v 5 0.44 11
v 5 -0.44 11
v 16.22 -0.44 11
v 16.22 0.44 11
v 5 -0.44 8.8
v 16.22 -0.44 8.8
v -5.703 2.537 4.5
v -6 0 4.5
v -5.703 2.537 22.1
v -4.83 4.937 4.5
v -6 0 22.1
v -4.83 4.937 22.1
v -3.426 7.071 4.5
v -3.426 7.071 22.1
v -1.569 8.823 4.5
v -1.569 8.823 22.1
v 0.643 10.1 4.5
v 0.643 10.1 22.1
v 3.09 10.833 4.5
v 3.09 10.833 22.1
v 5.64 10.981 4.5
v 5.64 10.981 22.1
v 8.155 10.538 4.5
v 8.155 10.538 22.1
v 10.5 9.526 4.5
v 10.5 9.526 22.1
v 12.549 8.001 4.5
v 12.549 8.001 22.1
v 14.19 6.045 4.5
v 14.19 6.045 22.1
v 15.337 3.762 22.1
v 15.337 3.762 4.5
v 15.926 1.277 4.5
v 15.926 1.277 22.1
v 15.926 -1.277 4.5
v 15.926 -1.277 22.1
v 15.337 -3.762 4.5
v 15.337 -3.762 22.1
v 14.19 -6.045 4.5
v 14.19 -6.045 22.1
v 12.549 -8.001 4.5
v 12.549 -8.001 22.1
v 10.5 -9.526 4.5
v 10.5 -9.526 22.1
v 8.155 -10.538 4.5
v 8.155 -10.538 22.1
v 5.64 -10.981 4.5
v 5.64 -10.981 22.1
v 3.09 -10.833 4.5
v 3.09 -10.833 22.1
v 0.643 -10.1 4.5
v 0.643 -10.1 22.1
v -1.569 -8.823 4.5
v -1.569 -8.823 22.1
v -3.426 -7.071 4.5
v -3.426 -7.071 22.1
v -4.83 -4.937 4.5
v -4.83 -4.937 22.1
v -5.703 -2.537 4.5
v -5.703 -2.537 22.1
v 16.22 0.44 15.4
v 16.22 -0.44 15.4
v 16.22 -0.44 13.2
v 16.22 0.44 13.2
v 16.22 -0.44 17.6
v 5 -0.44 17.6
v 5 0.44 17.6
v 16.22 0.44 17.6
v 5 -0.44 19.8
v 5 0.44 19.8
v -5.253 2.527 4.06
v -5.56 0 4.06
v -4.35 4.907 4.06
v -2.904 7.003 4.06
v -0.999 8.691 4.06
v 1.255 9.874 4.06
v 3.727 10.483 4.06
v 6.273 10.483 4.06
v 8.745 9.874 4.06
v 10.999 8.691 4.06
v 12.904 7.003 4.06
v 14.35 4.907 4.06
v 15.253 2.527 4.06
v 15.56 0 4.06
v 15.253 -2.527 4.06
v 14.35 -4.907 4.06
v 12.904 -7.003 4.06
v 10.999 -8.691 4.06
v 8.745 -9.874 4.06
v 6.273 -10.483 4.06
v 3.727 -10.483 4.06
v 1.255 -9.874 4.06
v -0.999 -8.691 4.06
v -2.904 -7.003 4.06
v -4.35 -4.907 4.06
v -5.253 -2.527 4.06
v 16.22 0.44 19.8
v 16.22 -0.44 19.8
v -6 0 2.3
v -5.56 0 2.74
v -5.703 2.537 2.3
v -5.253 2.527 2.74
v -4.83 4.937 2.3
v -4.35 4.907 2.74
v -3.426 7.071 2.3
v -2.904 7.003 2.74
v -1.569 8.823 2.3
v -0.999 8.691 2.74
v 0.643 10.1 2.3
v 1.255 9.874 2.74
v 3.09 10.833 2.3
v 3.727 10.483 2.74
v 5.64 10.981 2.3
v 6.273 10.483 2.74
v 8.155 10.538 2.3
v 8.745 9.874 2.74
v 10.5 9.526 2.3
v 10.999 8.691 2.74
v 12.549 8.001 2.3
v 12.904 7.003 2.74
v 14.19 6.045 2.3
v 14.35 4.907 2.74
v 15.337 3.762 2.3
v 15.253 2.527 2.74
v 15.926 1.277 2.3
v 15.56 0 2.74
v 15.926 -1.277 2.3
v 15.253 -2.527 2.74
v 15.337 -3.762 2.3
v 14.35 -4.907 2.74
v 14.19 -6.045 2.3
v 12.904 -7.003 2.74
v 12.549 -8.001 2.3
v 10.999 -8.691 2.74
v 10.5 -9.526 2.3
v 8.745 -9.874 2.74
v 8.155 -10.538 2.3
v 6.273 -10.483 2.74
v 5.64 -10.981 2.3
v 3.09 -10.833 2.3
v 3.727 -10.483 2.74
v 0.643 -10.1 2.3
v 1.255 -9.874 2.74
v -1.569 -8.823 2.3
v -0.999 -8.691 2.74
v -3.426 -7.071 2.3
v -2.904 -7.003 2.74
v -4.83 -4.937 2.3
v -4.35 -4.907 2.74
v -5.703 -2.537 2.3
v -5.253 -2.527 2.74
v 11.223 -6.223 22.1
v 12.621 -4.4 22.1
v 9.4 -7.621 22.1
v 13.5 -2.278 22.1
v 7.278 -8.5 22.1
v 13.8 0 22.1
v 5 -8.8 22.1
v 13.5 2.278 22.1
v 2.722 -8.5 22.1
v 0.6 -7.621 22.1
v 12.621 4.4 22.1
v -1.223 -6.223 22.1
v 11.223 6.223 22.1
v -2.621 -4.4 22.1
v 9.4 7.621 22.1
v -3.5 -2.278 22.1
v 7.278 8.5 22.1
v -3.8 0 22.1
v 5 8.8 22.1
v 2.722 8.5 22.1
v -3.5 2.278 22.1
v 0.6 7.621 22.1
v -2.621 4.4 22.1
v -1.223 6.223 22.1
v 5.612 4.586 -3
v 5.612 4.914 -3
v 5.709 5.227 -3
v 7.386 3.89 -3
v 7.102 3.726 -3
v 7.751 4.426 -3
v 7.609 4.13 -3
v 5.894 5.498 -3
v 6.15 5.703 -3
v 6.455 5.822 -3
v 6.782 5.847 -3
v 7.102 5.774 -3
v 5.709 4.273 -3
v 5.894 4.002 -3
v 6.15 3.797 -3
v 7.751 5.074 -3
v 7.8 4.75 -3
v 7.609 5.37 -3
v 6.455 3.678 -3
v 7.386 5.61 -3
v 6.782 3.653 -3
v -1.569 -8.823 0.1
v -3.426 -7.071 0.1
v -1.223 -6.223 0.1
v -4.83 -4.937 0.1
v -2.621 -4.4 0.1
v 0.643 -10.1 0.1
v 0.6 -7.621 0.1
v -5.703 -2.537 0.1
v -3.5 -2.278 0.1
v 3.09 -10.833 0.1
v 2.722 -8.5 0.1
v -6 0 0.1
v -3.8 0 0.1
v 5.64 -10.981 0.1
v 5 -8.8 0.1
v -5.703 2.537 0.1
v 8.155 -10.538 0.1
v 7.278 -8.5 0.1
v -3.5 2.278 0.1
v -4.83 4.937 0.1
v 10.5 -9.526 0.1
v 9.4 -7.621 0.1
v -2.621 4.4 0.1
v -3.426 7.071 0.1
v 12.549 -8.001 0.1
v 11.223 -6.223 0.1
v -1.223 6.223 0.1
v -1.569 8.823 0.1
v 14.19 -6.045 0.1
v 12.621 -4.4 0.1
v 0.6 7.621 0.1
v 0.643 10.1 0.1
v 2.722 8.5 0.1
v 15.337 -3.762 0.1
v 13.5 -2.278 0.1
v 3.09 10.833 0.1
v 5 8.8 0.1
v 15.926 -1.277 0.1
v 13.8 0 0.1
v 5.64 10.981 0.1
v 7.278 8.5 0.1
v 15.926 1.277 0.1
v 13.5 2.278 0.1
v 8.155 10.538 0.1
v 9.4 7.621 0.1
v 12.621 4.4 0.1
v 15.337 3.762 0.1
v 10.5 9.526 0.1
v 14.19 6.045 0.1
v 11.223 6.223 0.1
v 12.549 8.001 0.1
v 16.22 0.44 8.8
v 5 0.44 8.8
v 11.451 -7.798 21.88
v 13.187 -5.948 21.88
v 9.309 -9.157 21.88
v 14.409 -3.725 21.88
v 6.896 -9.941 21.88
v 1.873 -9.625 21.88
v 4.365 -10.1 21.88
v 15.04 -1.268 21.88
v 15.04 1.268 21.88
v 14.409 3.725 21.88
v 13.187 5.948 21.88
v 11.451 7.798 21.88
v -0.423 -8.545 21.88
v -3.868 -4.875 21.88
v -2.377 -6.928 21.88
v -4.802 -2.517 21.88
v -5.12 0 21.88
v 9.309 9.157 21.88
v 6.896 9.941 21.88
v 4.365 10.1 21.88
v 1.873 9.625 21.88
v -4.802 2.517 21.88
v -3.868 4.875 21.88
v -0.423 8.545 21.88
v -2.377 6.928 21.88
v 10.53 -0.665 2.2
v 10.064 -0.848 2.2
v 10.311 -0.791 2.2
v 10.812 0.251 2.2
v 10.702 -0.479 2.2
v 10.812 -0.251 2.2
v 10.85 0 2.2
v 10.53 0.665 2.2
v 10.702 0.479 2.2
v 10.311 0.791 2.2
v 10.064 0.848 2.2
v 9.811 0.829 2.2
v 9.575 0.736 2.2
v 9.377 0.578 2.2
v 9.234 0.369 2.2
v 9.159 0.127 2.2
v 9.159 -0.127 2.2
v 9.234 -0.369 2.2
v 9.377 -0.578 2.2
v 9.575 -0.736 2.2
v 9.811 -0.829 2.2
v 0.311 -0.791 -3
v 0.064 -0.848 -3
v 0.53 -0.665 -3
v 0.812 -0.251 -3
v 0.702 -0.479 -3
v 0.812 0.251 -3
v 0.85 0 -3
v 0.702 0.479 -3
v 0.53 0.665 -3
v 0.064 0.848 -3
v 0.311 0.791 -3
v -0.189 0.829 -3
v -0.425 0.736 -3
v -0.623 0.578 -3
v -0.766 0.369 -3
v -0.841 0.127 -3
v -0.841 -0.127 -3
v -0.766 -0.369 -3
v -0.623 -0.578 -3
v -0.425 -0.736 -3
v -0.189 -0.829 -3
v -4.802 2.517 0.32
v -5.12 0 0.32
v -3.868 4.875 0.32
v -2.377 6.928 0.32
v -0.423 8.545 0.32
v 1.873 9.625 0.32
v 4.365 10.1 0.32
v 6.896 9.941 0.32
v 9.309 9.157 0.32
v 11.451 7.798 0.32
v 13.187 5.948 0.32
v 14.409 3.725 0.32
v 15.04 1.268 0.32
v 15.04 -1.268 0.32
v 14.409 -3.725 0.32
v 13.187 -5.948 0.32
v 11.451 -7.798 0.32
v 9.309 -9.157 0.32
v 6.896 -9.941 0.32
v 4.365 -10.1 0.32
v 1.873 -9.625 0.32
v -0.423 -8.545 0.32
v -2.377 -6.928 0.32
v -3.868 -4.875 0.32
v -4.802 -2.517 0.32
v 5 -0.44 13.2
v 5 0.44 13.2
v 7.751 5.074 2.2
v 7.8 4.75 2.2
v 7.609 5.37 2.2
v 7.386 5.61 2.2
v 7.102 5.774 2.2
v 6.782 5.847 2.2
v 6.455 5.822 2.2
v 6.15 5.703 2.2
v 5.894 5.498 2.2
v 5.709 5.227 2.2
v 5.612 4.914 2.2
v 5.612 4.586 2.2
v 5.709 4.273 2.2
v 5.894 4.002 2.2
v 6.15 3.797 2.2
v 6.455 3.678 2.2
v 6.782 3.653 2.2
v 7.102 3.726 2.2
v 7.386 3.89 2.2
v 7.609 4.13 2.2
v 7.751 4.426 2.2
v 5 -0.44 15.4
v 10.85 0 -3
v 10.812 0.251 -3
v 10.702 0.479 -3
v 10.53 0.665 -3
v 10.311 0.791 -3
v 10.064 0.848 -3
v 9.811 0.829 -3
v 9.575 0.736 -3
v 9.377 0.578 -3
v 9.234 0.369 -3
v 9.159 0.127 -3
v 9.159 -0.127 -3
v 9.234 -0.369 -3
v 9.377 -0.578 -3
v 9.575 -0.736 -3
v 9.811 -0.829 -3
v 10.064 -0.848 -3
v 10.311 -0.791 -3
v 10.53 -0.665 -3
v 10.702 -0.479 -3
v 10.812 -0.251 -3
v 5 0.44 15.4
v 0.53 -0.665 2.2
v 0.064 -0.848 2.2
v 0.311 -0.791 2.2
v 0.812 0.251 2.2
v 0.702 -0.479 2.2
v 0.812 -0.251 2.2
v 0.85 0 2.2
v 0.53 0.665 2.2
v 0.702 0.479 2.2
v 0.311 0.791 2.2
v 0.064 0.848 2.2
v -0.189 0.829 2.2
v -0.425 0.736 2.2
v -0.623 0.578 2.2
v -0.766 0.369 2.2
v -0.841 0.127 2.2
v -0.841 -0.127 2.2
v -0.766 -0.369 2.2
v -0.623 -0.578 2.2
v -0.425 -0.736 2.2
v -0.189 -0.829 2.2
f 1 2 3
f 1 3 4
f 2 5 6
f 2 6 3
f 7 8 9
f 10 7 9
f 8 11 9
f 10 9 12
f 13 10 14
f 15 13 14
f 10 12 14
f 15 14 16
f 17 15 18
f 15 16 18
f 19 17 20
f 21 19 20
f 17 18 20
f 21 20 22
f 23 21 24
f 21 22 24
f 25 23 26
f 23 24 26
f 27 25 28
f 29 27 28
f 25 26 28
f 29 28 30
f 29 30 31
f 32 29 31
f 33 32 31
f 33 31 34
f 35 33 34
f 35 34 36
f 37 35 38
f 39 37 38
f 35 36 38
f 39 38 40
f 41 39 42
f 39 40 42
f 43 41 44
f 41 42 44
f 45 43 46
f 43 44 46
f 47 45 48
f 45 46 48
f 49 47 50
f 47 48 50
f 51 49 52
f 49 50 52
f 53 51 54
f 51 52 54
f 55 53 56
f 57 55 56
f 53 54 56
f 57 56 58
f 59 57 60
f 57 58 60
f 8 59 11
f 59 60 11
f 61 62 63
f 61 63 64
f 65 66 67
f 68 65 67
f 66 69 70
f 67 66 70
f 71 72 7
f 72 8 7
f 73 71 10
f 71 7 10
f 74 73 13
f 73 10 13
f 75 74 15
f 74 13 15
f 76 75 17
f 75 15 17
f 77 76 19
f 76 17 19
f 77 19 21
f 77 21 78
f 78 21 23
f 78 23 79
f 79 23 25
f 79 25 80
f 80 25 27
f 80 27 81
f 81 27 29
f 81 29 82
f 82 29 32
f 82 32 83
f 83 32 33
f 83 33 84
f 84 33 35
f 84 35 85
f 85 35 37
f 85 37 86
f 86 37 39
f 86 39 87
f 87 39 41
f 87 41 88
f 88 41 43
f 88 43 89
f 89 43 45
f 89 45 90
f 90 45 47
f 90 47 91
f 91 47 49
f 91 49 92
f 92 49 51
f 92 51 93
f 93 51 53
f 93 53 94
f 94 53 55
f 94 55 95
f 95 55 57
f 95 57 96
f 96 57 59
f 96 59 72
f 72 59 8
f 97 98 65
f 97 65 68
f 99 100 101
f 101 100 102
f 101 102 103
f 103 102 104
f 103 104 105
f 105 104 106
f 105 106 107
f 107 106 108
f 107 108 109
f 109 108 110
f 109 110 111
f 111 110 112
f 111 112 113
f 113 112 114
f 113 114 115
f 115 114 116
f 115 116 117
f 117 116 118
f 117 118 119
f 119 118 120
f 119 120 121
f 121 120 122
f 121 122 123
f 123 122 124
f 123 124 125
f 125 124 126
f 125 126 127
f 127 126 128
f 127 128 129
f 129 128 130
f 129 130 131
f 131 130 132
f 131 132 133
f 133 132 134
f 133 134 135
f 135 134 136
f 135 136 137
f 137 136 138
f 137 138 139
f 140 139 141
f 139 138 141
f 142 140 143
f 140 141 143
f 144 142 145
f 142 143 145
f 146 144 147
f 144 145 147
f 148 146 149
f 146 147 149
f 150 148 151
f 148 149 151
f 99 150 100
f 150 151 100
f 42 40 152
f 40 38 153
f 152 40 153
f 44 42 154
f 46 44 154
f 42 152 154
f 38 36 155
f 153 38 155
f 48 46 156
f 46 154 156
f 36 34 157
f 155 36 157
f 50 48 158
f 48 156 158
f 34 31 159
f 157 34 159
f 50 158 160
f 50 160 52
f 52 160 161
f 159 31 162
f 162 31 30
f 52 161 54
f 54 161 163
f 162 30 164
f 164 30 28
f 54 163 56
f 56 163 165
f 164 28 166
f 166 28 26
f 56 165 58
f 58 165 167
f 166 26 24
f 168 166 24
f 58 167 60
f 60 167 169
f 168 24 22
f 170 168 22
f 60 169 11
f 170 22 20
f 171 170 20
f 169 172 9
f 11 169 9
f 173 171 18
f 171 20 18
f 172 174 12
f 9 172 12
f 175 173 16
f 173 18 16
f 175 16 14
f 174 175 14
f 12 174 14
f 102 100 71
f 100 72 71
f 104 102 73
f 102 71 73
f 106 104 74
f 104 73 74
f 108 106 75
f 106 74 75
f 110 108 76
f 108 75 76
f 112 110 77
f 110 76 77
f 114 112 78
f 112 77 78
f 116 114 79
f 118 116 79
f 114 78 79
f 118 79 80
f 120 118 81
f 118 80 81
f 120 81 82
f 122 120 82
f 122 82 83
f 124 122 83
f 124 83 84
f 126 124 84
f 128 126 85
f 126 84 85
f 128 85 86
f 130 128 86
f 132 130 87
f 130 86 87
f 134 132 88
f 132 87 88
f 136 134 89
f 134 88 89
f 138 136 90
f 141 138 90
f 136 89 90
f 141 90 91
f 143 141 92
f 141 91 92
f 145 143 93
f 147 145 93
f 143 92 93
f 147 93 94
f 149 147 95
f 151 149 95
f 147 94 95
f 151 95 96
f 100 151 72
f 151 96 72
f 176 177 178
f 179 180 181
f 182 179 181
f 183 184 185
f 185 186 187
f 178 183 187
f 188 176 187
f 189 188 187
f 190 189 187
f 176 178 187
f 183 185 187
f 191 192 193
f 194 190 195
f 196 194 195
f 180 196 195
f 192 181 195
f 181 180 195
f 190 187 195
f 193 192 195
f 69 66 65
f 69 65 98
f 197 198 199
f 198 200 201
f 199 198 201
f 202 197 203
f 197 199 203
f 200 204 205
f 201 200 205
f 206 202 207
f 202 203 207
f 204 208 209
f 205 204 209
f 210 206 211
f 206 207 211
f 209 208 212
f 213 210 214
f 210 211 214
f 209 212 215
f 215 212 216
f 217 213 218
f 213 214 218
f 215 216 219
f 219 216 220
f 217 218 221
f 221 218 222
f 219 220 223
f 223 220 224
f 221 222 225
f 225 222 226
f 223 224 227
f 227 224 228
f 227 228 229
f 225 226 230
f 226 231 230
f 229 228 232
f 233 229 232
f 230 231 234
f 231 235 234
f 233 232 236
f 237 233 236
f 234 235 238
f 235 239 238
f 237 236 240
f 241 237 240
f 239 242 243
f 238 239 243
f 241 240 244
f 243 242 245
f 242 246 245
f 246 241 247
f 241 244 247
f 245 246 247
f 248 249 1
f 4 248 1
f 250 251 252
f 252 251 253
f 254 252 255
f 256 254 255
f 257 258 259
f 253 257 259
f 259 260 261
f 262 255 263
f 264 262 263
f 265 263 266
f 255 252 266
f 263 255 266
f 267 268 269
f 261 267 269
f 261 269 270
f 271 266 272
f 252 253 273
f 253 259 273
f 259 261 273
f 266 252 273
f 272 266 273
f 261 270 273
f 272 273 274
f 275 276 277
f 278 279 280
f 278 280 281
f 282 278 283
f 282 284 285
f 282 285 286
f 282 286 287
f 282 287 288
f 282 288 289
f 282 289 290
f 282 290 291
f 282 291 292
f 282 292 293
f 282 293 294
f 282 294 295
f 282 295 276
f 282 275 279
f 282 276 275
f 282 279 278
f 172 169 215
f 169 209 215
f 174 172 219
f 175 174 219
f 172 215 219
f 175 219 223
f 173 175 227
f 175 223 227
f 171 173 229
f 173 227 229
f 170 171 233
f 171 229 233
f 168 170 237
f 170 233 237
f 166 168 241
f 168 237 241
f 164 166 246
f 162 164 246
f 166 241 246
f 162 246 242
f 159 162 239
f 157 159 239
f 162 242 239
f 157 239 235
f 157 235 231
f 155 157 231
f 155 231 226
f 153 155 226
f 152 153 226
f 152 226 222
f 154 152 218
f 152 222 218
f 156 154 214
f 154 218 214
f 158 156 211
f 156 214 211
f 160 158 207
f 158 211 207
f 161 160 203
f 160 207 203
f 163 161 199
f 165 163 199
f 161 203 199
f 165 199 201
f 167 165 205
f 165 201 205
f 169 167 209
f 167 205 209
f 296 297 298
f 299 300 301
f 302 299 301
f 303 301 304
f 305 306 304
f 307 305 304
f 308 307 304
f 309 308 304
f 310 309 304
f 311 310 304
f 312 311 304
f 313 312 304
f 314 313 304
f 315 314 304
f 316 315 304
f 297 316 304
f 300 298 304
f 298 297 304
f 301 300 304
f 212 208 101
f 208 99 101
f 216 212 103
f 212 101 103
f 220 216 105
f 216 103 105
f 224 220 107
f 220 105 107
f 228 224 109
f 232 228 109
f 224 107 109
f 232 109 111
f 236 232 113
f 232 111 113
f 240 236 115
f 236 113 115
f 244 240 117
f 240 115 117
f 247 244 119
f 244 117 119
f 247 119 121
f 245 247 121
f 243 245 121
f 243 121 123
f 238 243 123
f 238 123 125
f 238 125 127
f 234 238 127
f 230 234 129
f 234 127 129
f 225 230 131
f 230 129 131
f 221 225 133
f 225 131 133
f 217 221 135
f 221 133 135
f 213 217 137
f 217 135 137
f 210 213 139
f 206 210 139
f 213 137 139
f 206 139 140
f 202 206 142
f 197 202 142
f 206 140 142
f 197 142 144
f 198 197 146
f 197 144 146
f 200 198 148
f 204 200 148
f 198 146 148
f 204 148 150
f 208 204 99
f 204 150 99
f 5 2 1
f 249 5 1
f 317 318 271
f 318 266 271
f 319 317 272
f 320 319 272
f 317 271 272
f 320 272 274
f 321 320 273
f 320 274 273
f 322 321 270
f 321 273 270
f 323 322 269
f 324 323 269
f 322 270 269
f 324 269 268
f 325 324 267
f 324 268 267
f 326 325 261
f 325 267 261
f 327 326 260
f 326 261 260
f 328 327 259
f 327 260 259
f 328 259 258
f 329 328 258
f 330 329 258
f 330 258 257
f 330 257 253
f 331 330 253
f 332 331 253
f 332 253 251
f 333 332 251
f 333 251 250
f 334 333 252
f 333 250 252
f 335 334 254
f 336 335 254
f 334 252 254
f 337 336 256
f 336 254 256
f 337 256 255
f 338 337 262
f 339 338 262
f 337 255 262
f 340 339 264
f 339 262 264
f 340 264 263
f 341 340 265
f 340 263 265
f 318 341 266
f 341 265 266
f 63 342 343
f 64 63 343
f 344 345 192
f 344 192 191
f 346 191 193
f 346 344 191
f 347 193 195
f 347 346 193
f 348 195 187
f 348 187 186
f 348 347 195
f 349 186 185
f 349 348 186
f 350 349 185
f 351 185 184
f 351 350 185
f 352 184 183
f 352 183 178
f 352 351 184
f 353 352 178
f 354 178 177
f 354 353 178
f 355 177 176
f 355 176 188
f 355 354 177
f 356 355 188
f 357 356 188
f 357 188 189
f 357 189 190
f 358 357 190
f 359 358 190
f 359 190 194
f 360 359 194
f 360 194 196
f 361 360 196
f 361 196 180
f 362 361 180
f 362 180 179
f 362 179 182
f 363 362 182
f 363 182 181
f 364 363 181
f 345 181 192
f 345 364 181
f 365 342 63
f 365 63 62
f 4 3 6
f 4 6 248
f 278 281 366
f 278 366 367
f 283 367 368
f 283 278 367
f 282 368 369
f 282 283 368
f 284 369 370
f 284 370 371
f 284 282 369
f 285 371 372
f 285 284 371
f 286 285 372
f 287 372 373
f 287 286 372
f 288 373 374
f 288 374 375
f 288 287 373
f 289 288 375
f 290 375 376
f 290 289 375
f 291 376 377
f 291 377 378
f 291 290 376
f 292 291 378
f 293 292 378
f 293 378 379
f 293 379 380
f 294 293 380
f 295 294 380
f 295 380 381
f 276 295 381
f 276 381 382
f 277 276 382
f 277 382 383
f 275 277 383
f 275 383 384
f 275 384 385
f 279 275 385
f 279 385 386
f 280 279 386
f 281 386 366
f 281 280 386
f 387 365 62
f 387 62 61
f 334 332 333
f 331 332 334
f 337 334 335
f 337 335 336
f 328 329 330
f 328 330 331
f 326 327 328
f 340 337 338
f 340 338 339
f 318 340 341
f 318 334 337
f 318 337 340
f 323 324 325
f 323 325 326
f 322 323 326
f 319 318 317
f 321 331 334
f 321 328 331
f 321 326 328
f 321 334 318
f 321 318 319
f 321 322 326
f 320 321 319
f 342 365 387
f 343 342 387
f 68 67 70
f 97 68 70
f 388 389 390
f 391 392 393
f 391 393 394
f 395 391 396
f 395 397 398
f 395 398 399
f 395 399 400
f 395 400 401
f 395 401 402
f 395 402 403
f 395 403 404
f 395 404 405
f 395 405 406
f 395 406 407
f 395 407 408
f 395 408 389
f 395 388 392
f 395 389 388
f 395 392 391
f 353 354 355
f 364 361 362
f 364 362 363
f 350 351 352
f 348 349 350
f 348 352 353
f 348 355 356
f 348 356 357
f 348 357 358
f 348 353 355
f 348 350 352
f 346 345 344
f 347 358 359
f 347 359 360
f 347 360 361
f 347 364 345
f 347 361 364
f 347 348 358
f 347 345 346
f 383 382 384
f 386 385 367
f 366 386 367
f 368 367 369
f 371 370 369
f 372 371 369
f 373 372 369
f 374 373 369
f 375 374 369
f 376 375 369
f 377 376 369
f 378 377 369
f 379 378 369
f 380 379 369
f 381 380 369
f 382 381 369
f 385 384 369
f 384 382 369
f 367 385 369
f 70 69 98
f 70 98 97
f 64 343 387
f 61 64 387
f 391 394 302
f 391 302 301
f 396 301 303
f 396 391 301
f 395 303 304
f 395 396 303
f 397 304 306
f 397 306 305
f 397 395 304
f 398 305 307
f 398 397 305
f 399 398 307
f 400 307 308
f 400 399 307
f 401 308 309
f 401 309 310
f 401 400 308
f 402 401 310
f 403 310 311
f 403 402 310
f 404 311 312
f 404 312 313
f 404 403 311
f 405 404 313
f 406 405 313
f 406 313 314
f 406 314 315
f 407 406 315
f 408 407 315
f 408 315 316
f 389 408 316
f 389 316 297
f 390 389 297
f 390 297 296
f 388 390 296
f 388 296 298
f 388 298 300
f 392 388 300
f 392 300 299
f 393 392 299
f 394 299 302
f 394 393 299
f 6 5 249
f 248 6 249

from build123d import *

# Parameters (mm, degrees)
SKETCH002_W   = 10.12
SKETCH002_H   = 21.56
SKETCH003_R   = 0.85
SKETCH003_R_2 = 1.1
PAD_DEPTH     = 5.2
SKETCH004_W   = 0.88
SKETCH004_H   = 2.2
PAD001_DEPTH  = 11.22


with BuildPart() as revolution:
    # Sketch → Revolution (revolve)
    with BuildSketch(Plane.XZ):
        Polygon((-6, 0.1), (-6, 2.3), (-5.56, 2.74), (-5.56, 4.06), (-6, 4.5), (-6, 22.1), (-3.8, 22.1), (-3.8, 0.1), align=None)
    revolve(axis=Axis((5, 0, 7.548619), (0, 0, -1)))


with BuildPart() as revolution001:
    # Sketch002 → Revolution001 (revolve)
    with BuildSketch(Plane.XZ):
        with Locations((-0.06, 11.1)):
            Rectangle(SKETCH002_W, SKETCH002_H)
    revolve(axis=Axis((5, 0, 4.680116), (0, 0, -1)))


with BuildPart() as pad:
    # Sketch003 → Pad (new body)
    with BuildSketch(Plane.XY.offset(2.2)):
        Circle(SKETCH003_R)
        with Locations((10, 0)):
            Circle(SKETCH003_R)
        with Locations((6.7, 4.75)):
            Circle(SKETCH003_R_2)
    extrude(amount=-PAD_DEPTH)


with BuildPart() as pad001:
    # Sketch004 → Pad001 (new body)
    with BuildSketch(Plane.YZ.offset(5)):
        with Locations((0, 9.9)):
            Rectangle(SKETCH004_W, SKETCH004_H)
        with Locations((0, 14.3)):
            Rectangle(SKETCH004_W, SKETCH004_H)
        with Locations((0, 18.7)):
            Rectangle(SKETCH004_W, SKETCH004_H)
    extrude(amount=PAD001_DEPTH)


solid = Compound([revolution.part, revolution001.part, pad.part, pad001.part])
